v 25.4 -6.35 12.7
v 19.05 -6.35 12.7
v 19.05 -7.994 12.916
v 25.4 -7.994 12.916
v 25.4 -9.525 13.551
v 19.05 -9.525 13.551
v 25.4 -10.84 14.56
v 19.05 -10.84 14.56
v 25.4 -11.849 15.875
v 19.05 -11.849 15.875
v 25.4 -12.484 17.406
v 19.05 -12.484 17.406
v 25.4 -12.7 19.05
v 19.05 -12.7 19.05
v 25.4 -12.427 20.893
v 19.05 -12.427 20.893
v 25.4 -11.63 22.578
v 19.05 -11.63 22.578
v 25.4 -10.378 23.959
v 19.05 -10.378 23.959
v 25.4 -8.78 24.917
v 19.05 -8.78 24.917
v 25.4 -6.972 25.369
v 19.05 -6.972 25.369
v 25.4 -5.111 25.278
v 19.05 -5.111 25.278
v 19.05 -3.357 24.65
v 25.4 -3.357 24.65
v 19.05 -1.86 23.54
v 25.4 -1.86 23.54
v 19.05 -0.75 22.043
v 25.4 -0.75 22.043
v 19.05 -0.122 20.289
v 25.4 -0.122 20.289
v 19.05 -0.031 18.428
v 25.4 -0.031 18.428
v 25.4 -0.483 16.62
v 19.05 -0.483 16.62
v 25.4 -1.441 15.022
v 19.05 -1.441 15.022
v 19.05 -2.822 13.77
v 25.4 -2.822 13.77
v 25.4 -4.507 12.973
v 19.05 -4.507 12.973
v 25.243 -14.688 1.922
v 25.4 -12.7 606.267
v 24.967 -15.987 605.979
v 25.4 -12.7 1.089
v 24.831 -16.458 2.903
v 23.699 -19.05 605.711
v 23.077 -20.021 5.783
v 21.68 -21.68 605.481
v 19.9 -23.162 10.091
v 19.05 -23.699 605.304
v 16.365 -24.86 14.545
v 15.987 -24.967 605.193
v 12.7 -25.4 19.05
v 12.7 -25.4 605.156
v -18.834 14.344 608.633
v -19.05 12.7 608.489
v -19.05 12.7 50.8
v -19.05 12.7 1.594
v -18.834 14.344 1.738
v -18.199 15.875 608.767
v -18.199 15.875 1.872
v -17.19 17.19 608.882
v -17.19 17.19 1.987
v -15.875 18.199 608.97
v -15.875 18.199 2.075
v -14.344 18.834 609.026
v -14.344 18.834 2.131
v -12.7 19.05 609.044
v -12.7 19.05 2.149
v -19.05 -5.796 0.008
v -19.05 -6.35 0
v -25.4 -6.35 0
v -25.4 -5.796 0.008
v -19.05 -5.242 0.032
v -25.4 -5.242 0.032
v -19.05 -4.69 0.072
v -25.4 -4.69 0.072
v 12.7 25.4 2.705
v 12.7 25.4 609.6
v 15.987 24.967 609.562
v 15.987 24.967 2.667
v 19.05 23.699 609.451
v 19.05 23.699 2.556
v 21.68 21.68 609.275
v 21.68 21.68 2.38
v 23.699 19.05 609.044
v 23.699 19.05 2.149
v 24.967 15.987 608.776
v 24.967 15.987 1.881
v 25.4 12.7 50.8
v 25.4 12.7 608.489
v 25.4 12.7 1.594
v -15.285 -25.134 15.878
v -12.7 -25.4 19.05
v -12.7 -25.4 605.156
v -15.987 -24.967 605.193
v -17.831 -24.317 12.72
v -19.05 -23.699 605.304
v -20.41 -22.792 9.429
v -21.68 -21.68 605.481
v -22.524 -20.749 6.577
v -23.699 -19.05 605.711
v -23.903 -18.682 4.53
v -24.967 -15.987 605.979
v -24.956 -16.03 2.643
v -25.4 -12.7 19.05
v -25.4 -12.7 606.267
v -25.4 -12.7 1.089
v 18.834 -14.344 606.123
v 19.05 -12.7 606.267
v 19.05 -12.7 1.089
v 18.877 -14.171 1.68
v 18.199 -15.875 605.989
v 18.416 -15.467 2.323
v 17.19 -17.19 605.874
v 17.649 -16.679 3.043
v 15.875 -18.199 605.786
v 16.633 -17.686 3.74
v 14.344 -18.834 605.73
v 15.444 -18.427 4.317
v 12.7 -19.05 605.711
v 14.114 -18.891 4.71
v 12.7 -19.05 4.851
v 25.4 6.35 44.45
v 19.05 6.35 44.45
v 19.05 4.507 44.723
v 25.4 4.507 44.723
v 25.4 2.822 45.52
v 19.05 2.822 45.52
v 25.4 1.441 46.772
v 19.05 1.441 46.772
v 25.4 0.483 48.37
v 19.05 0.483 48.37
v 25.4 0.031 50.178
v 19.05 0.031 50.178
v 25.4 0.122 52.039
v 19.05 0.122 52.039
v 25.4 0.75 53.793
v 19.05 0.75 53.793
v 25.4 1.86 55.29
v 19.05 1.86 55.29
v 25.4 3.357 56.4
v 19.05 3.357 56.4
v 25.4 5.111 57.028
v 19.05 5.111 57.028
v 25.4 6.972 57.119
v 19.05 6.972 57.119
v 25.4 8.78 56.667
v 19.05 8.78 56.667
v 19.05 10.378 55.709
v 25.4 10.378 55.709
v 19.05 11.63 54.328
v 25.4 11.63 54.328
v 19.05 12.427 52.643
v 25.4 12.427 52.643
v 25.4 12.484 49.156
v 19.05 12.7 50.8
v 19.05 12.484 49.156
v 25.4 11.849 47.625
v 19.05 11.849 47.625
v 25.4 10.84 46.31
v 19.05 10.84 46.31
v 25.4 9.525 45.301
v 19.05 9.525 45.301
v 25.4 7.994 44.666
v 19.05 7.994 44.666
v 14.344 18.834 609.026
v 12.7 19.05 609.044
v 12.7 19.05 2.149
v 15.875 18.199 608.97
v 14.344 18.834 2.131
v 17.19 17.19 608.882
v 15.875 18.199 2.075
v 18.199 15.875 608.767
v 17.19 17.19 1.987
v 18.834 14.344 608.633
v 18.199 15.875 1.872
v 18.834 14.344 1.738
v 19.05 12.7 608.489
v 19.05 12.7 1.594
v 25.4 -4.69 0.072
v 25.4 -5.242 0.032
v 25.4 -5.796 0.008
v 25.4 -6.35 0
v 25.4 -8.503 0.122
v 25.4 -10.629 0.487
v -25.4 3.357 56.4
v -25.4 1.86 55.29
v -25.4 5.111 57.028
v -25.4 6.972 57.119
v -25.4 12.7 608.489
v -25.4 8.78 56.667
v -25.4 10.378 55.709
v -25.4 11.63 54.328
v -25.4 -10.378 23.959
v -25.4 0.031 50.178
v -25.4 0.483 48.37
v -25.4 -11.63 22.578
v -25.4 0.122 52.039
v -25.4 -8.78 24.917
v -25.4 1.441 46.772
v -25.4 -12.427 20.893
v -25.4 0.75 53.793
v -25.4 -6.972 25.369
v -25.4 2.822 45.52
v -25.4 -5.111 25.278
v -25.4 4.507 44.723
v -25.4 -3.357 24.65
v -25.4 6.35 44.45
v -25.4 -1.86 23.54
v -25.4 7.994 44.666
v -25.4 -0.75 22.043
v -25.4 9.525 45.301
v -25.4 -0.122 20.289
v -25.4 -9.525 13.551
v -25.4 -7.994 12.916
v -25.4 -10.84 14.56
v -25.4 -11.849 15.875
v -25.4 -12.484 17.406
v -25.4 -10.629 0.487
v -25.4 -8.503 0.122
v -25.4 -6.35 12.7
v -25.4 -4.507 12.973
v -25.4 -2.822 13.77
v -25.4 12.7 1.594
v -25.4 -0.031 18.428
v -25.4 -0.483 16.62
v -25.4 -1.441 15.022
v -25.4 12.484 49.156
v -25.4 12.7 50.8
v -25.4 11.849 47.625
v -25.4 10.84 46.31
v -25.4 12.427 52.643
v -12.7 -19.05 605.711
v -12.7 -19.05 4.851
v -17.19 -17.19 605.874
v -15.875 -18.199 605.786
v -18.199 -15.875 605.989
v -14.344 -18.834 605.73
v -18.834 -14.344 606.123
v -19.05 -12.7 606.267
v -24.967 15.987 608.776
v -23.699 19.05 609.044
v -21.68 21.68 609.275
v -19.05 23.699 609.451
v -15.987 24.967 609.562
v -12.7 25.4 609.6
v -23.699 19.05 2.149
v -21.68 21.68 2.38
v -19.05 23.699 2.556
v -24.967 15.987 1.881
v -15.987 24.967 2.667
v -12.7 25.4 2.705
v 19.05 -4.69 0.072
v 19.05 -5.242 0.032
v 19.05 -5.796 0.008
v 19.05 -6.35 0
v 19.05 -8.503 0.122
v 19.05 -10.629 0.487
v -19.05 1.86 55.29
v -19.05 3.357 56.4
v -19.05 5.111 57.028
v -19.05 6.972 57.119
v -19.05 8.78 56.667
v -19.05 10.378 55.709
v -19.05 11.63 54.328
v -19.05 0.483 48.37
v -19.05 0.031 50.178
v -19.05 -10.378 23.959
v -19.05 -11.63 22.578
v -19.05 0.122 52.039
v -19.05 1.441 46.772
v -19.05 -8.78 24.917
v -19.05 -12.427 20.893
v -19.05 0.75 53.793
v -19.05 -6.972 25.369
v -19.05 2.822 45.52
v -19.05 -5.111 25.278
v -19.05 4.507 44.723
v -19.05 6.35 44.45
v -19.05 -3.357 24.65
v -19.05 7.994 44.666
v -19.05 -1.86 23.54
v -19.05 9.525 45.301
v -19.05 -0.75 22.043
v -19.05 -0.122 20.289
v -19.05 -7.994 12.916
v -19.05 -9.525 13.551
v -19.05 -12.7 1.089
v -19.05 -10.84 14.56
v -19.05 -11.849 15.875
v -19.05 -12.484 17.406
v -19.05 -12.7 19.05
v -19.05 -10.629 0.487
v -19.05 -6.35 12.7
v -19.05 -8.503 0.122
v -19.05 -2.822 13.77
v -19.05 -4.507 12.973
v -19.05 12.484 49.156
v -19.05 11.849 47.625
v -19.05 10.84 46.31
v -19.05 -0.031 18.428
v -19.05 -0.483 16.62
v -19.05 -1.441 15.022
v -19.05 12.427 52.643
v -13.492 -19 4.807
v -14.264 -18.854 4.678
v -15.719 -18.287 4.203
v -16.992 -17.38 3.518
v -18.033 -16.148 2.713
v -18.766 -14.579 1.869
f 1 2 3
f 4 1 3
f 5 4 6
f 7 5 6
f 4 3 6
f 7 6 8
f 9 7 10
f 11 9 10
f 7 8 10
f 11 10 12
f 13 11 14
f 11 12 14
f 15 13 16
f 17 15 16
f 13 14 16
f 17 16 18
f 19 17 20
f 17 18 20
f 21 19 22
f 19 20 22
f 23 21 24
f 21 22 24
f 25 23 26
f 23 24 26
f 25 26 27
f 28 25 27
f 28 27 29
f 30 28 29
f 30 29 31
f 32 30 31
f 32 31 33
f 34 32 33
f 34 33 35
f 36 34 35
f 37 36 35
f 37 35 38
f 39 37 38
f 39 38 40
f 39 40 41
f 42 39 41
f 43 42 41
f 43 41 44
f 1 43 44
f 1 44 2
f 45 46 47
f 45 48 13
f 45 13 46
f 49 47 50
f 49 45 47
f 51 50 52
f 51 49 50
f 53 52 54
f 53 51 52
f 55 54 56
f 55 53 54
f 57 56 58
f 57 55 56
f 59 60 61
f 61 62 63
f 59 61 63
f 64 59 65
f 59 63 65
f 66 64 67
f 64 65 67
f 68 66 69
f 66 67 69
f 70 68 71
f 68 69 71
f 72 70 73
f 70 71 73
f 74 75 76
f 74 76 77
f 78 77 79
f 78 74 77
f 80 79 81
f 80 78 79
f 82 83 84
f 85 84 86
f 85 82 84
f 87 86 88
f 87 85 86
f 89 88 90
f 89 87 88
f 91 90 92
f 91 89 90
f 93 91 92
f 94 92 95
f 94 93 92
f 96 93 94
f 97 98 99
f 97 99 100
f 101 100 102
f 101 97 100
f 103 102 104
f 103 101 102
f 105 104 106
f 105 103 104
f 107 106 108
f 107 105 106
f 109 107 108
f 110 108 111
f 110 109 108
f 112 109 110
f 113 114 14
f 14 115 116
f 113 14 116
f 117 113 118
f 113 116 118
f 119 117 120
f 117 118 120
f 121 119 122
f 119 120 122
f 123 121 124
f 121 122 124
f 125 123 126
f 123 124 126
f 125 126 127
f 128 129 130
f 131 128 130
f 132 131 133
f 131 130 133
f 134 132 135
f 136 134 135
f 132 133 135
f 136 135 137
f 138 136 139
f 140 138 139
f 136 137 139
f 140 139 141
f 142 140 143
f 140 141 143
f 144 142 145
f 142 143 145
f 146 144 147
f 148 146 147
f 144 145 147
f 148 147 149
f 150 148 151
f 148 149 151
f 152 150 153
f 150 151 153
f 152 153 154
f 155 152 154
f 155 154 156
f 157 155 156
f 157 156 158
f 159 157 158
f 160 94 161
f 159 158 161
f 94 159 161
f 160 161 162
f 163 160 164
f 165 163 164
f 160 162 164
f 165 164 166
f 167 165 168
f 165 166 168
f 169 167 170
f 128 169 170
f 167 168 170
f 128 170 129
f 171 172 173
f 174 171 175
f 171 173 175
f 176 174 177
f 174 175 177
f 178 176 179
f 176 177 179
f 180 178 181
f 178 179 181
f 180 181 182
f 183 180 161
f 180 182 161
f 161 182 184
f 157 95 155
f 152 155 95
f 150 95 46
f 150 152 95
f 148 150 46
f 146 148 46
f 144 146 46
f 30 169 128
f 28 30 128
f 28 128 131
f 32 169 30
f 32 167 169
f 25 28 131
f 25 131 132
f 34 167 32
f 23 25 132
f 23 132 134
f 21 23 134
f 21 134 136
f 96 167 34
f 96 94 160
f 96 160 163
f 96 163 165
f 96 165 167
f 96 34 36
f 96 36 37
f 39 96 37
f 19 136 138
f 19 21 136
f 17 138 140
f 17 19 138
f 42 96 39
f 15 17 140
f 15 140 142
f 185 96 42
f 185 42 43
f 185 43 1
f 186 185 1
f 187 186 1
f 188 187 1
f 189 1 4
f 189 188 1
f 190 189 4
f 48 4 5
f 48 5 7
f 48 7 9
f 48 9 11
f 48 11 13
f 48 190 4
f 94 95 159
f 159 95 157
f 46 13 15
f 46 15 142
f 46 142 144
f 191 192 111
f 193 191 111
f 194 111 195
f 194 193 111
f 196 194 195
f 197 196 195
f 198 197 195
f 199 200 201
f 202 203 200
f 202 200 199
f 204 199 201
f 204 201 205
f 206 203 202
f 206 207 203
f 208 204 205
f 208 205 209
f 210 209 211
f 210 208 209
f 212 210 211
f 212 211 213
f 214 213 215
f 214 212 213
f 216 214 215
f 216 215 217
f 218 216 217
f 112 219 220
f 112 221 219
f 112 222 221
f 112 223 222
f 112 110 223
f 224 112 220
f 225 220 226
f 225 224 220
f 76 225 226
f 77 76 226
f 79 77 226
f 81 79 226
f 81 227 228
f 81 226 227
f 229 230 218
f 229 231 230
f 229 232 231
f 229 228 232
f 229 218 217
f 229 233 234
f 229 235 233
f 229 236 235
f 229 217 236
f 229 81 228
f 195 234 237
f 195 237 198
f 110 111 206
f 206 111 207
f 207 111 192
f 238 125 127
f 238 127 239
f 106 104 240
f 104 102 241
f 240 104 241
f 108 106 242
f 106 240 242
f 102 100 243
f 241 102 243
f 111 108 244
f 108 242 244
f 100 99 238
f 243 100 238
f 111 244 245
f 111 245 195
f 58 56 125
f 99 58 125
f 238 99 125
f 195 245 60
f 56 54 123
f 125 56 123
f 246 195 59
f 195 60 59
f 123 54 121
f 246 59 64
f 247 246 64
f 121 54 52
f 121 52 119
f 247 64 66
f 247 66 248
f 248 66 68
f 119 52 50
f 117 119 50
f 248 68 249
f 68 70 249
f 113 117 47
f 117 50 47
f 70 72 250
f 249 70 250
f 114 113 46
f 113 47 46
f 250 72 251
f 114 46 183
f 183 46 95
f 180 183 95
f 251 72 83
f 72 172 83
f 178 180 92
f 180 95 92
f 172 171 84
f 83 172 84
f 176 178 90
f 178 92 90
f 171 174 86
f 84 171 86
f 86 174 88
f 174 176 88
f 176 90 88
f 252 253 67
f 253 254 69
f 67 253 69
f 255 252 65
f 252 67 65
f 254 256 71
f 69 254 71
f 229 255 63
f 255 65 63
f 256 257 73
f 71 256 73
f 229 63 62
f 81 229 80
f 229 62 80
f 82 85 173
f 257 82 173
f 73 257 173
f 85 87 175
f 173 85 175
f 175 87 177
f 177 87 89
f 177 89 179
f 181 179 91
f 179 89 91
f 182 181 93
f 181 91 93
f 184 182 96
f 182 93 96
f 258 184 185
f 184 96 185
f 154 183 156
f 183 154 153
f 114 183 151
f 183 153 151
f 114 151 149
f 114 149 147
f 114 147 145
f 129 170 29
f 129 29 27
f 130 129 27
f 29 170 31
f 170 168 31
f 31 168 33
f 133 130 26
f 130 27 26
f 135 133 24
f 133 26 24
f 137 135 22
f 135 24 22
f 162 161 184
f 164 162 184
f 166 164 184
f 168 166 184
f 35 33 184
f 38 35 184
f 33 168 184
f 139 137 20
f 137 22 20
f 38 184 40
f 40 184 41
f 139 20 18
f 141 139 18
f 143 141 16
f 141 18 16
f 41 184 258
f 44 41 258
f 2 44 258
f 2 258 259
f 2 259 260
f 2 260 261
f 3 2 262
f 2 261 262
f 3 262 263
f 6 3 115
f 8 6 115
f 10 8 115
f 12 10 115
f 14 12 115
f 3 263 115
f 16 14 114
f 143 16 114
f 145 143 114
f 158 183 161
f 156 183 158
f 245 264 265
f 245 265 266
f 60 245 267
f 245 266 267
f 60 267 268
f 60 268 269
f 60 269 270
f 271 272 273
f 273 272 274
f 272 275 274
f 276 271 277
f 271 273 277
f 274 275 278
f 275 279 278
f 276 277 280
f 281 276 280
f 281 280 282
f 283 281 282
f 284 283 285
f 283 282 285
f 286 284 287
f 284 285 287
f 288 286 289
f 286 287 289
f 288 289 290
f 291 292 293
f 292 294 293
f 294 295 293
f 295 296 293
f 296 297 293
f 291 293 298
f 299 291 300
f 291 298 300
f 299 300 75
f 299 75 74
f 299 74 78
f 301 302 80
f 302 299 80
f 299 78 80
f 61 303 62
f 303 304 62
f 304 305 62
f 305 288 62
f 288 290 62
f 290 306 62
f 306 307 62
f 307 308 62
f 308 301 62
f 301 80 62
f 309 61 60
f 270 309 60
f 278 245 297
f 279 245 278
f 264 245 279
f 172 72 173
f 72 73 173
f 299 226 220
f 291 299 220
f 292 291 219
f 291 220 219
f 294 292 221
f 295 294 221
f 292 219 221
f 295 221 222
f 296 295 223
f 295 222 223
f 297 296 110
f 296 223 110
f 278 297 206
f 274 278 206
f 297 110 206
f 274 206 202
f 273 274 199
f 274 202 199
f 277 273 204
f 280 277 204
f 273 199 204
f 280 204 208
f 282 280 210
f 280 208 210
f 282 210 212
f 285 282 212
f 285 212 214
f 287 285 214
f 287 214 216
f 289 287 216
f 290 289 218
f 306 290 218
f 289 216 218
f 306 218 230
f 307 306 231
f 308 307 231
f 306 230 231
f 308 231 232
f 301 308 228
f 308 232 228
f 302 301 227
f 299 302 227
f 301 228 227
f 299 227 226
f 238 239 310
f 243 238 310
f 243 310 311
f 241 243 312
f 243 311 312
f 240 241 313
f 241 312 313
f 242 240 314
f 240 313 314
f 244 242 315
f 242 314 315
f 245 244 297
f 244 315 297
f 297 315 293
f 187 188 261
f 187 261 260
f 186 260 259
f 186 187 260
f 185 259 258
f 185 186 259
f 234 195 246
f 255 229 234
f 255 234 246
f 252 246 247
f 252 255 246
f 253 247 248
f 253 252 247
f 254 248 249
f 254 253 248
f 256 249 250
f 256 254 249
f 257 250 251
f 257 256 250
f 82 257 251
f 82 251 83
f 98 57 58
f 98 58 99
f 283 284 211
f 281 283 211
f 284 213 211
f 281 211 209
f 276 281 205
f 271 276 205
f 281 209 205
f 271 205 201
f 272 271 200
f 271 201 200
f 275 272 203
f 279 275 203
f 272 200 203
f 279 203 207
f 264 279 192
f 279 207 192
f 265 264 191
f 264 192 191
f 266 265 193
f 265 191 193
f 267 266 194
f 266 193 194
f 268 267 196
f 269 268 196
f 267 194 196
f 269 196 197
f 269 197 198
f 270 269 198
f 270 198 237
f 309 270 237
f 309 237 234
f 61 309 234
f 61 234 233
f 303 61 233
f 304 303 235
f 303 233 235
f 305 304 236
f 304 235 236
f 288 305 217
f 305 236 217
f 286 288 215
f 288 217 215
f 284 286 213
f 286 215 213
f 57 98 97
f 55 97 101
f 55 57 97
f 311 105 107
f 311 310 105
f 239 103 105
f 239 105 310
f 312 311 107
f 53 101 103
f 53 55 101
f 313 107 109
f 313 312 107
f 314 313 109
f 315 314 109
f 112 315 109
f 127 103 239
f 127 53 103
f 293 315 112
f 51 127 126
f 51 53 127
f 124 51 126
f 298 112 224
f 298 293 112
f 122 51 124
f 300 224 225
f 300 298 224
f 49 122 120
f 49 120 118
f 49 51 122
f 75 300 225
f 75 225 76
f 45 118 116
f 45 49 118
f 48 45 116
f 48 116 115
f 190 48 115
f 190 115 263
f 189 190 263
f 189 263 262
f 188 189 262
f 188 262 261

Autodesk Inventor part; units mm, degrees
ref_plane "YZ Plane" through (0, 0, 0) normal (1, 0, 0) x (0, 1, 0)
ref_plane "Start plane" through (0, 0, 0) normal (0, 0, 1) x (1, 0, 0)
ref_plane "End plane" through (0, 0, 609.6) normal (0, 0, 1) x (1, 0, 0)
sketch "Sketch" plane through (0, 0, 0) normal (0, 0, 1) x (1, 0, 0)
  line L0 (-25.4, -12.7) -> (-25.4, 12.7)
  line L1 (-12.7, 25.4) -> (12.7, 25.4)
  line L2 (25.4, 12.7) -> (25.4, -12.7)
  line L3 (12.7, -25.4) -> (-12.7, -25.4)
  arc A0 (-25.4, -12.7) -> (-12.7, -25.4) centre (-12.7, -12.7) ccw
  arc A1 (-12.7, 25.4) -> (-25.4, 12.7) centre (-12.7, 12.7) ccw
  arc A2 (25.4, 12.7) -> (12.7, 25.4) centre (12.7, 12.7) ccw
  arc A3 (12.7, -25.4) -> (25.4, -12.7) centre (12.7, -12.7) ccw
  arc A4 (-12.7, 19.05) -> (-19.05, 12.7) centre (-12.7, 12.7) ccw
  line L4 (-12.7, 19.05) -> (12.7, 19.05)
  arc A5 (19.05, 12.7) -> (12.7, 19.05) centre (12.7, 12.7) ccw
  line L5 (19.05, 12.7) -> (19.05, -12.7)
  arc A6 (12.7, -19.05) -> (19.05, -12.7) centre (12.7, -12.7) ccw
  line L6 (12.7, -19.05) -> (-12.7, -19.05)
  arc A7 (-19.05, -12.7) -> (-12.7, -19.05) centre (-12.7, -12.7) ccw
  line L7 (-19.05, -12.7) -> (-19.05, 12.7)
  line L8 (0, 39.2424) -> (0, -39.2424) construction
  line L9 (-39.2424, 0) -> (39.2424, 0) construction
  dimension "d10" = 50.8
  dimension "d11" = 50.8
  dimension "d12" = 6.35
  dimension "d15" = 25.4
  dimension "d16" = 25.4
  dimension "d17" = 12.7
extrude "Body" add sketch "Sketch" along normal up to surface (609.6 mm away) from surface at 0
sketch "Sketch3" plane through (0, 0, 0) normal (0, 0, 1) x (1, 0, 0)
  line L0 (0, 0) -> (10, 0)
ref_plane "Work Plane3" through (0, 0, 0) normal (0, -1, 0) x (1, 0, 0)
sketch "Sketch4" plane through (0, 0, 0) normal (0, -1, 0) x (1, 0, 0)
  line L0 (-2, 0) -> (12, 0)
  line L1 (-2, 609.6) -> (12, 609.6)
  dimension "d19" = 609.6
sketch "Sketch5" plane through (25.4, -12.7, 609.6) normal (1, 0, 0) x (0, 0, -1)
  line L0 (609.6, 25.4) -> (609.6, 38.1) projected
  line L1 (609.6, 25.4) -> (609.6, 0) projected
  line L2 (609.6, -12.7) -> (609.6, 0) projected
  line L3 (609.6, 38.1) -> (606.895, 38.1)
  line L4 (606.895, 38.1) -> (609.5275, 8.0103)
  line L5 (609.6, -12.7) -> (590.55, -12.7)
  arc A0 (609.6, 6.35) -> (609.5275, 8.0103) centre (590.55, 6.35) ccw
  arc A1 (590.55, -12.7) -> (609.6, 6.35) centre (590.55, 6.35) ccw
  line L6 (0, 25.4) -> (0, 38.1) projected
  line L7 (0, 25.4) -> (0, 0) projected
  line L8 (0, -12.7) -> (0, 0) projected
  line L9 (0, -12.7) -> (4.4444, -12.7)
  line L10 (4.4444, -12.7) -> (0, 38.1)
  point P0 (609.6, 12.7)
  dimension "d20" = 5
  dimension "d23" = 19.05
extrude "Extrusion2" cut sketch "Sketch5" against normal through all
hole "Hole1" at (25.4, -6.35, 19.05) direction (-1, 0, 0) diameter 12.7 end through all
sketch "Sketch6" plane through (25.4, 12.7, 608.4889) normal (1, 0, 0) x (0, 0, -1)
  point P0 (608.4889, -12.7)
  point P1 (557.6889, -6.35)
  dimension "d33" = 50.8
  dimension "d34" = 6.35
hole "Hole2" at (25.4, 6.35, 50.8) direction (-1, 0, 0) diameter 12.7 end through all
equation "\"d10\" = G_H"
equation "\"d11\" = G_W"
equation "\"d12\" = G_T"
equation "\"d15\" = 0.5 * d10"
equation "\"d16\" = 0.5 * d11"
equation "\"d17\" = G_IR"
equation "\"d3\" = G_L"
equation "\"G_W\" = 50.8"
equation "\"G_H\" = 50.8"
equation "\"G_T\" = 6.35"
equation "\"G_IR\" = 12.7"
equation "\"G_L\" = d19"
equation "\"G_OFFSET_START\" = 0"
equation "\"G_OFFSET_END\" = 0"
equation "\"d14\" = G_OFFSET_END + B_L"
equation "\"B_L\" = 609.6"
properties part number "A1-18002-200-01 Leg tube" material "Steel, Mild"
